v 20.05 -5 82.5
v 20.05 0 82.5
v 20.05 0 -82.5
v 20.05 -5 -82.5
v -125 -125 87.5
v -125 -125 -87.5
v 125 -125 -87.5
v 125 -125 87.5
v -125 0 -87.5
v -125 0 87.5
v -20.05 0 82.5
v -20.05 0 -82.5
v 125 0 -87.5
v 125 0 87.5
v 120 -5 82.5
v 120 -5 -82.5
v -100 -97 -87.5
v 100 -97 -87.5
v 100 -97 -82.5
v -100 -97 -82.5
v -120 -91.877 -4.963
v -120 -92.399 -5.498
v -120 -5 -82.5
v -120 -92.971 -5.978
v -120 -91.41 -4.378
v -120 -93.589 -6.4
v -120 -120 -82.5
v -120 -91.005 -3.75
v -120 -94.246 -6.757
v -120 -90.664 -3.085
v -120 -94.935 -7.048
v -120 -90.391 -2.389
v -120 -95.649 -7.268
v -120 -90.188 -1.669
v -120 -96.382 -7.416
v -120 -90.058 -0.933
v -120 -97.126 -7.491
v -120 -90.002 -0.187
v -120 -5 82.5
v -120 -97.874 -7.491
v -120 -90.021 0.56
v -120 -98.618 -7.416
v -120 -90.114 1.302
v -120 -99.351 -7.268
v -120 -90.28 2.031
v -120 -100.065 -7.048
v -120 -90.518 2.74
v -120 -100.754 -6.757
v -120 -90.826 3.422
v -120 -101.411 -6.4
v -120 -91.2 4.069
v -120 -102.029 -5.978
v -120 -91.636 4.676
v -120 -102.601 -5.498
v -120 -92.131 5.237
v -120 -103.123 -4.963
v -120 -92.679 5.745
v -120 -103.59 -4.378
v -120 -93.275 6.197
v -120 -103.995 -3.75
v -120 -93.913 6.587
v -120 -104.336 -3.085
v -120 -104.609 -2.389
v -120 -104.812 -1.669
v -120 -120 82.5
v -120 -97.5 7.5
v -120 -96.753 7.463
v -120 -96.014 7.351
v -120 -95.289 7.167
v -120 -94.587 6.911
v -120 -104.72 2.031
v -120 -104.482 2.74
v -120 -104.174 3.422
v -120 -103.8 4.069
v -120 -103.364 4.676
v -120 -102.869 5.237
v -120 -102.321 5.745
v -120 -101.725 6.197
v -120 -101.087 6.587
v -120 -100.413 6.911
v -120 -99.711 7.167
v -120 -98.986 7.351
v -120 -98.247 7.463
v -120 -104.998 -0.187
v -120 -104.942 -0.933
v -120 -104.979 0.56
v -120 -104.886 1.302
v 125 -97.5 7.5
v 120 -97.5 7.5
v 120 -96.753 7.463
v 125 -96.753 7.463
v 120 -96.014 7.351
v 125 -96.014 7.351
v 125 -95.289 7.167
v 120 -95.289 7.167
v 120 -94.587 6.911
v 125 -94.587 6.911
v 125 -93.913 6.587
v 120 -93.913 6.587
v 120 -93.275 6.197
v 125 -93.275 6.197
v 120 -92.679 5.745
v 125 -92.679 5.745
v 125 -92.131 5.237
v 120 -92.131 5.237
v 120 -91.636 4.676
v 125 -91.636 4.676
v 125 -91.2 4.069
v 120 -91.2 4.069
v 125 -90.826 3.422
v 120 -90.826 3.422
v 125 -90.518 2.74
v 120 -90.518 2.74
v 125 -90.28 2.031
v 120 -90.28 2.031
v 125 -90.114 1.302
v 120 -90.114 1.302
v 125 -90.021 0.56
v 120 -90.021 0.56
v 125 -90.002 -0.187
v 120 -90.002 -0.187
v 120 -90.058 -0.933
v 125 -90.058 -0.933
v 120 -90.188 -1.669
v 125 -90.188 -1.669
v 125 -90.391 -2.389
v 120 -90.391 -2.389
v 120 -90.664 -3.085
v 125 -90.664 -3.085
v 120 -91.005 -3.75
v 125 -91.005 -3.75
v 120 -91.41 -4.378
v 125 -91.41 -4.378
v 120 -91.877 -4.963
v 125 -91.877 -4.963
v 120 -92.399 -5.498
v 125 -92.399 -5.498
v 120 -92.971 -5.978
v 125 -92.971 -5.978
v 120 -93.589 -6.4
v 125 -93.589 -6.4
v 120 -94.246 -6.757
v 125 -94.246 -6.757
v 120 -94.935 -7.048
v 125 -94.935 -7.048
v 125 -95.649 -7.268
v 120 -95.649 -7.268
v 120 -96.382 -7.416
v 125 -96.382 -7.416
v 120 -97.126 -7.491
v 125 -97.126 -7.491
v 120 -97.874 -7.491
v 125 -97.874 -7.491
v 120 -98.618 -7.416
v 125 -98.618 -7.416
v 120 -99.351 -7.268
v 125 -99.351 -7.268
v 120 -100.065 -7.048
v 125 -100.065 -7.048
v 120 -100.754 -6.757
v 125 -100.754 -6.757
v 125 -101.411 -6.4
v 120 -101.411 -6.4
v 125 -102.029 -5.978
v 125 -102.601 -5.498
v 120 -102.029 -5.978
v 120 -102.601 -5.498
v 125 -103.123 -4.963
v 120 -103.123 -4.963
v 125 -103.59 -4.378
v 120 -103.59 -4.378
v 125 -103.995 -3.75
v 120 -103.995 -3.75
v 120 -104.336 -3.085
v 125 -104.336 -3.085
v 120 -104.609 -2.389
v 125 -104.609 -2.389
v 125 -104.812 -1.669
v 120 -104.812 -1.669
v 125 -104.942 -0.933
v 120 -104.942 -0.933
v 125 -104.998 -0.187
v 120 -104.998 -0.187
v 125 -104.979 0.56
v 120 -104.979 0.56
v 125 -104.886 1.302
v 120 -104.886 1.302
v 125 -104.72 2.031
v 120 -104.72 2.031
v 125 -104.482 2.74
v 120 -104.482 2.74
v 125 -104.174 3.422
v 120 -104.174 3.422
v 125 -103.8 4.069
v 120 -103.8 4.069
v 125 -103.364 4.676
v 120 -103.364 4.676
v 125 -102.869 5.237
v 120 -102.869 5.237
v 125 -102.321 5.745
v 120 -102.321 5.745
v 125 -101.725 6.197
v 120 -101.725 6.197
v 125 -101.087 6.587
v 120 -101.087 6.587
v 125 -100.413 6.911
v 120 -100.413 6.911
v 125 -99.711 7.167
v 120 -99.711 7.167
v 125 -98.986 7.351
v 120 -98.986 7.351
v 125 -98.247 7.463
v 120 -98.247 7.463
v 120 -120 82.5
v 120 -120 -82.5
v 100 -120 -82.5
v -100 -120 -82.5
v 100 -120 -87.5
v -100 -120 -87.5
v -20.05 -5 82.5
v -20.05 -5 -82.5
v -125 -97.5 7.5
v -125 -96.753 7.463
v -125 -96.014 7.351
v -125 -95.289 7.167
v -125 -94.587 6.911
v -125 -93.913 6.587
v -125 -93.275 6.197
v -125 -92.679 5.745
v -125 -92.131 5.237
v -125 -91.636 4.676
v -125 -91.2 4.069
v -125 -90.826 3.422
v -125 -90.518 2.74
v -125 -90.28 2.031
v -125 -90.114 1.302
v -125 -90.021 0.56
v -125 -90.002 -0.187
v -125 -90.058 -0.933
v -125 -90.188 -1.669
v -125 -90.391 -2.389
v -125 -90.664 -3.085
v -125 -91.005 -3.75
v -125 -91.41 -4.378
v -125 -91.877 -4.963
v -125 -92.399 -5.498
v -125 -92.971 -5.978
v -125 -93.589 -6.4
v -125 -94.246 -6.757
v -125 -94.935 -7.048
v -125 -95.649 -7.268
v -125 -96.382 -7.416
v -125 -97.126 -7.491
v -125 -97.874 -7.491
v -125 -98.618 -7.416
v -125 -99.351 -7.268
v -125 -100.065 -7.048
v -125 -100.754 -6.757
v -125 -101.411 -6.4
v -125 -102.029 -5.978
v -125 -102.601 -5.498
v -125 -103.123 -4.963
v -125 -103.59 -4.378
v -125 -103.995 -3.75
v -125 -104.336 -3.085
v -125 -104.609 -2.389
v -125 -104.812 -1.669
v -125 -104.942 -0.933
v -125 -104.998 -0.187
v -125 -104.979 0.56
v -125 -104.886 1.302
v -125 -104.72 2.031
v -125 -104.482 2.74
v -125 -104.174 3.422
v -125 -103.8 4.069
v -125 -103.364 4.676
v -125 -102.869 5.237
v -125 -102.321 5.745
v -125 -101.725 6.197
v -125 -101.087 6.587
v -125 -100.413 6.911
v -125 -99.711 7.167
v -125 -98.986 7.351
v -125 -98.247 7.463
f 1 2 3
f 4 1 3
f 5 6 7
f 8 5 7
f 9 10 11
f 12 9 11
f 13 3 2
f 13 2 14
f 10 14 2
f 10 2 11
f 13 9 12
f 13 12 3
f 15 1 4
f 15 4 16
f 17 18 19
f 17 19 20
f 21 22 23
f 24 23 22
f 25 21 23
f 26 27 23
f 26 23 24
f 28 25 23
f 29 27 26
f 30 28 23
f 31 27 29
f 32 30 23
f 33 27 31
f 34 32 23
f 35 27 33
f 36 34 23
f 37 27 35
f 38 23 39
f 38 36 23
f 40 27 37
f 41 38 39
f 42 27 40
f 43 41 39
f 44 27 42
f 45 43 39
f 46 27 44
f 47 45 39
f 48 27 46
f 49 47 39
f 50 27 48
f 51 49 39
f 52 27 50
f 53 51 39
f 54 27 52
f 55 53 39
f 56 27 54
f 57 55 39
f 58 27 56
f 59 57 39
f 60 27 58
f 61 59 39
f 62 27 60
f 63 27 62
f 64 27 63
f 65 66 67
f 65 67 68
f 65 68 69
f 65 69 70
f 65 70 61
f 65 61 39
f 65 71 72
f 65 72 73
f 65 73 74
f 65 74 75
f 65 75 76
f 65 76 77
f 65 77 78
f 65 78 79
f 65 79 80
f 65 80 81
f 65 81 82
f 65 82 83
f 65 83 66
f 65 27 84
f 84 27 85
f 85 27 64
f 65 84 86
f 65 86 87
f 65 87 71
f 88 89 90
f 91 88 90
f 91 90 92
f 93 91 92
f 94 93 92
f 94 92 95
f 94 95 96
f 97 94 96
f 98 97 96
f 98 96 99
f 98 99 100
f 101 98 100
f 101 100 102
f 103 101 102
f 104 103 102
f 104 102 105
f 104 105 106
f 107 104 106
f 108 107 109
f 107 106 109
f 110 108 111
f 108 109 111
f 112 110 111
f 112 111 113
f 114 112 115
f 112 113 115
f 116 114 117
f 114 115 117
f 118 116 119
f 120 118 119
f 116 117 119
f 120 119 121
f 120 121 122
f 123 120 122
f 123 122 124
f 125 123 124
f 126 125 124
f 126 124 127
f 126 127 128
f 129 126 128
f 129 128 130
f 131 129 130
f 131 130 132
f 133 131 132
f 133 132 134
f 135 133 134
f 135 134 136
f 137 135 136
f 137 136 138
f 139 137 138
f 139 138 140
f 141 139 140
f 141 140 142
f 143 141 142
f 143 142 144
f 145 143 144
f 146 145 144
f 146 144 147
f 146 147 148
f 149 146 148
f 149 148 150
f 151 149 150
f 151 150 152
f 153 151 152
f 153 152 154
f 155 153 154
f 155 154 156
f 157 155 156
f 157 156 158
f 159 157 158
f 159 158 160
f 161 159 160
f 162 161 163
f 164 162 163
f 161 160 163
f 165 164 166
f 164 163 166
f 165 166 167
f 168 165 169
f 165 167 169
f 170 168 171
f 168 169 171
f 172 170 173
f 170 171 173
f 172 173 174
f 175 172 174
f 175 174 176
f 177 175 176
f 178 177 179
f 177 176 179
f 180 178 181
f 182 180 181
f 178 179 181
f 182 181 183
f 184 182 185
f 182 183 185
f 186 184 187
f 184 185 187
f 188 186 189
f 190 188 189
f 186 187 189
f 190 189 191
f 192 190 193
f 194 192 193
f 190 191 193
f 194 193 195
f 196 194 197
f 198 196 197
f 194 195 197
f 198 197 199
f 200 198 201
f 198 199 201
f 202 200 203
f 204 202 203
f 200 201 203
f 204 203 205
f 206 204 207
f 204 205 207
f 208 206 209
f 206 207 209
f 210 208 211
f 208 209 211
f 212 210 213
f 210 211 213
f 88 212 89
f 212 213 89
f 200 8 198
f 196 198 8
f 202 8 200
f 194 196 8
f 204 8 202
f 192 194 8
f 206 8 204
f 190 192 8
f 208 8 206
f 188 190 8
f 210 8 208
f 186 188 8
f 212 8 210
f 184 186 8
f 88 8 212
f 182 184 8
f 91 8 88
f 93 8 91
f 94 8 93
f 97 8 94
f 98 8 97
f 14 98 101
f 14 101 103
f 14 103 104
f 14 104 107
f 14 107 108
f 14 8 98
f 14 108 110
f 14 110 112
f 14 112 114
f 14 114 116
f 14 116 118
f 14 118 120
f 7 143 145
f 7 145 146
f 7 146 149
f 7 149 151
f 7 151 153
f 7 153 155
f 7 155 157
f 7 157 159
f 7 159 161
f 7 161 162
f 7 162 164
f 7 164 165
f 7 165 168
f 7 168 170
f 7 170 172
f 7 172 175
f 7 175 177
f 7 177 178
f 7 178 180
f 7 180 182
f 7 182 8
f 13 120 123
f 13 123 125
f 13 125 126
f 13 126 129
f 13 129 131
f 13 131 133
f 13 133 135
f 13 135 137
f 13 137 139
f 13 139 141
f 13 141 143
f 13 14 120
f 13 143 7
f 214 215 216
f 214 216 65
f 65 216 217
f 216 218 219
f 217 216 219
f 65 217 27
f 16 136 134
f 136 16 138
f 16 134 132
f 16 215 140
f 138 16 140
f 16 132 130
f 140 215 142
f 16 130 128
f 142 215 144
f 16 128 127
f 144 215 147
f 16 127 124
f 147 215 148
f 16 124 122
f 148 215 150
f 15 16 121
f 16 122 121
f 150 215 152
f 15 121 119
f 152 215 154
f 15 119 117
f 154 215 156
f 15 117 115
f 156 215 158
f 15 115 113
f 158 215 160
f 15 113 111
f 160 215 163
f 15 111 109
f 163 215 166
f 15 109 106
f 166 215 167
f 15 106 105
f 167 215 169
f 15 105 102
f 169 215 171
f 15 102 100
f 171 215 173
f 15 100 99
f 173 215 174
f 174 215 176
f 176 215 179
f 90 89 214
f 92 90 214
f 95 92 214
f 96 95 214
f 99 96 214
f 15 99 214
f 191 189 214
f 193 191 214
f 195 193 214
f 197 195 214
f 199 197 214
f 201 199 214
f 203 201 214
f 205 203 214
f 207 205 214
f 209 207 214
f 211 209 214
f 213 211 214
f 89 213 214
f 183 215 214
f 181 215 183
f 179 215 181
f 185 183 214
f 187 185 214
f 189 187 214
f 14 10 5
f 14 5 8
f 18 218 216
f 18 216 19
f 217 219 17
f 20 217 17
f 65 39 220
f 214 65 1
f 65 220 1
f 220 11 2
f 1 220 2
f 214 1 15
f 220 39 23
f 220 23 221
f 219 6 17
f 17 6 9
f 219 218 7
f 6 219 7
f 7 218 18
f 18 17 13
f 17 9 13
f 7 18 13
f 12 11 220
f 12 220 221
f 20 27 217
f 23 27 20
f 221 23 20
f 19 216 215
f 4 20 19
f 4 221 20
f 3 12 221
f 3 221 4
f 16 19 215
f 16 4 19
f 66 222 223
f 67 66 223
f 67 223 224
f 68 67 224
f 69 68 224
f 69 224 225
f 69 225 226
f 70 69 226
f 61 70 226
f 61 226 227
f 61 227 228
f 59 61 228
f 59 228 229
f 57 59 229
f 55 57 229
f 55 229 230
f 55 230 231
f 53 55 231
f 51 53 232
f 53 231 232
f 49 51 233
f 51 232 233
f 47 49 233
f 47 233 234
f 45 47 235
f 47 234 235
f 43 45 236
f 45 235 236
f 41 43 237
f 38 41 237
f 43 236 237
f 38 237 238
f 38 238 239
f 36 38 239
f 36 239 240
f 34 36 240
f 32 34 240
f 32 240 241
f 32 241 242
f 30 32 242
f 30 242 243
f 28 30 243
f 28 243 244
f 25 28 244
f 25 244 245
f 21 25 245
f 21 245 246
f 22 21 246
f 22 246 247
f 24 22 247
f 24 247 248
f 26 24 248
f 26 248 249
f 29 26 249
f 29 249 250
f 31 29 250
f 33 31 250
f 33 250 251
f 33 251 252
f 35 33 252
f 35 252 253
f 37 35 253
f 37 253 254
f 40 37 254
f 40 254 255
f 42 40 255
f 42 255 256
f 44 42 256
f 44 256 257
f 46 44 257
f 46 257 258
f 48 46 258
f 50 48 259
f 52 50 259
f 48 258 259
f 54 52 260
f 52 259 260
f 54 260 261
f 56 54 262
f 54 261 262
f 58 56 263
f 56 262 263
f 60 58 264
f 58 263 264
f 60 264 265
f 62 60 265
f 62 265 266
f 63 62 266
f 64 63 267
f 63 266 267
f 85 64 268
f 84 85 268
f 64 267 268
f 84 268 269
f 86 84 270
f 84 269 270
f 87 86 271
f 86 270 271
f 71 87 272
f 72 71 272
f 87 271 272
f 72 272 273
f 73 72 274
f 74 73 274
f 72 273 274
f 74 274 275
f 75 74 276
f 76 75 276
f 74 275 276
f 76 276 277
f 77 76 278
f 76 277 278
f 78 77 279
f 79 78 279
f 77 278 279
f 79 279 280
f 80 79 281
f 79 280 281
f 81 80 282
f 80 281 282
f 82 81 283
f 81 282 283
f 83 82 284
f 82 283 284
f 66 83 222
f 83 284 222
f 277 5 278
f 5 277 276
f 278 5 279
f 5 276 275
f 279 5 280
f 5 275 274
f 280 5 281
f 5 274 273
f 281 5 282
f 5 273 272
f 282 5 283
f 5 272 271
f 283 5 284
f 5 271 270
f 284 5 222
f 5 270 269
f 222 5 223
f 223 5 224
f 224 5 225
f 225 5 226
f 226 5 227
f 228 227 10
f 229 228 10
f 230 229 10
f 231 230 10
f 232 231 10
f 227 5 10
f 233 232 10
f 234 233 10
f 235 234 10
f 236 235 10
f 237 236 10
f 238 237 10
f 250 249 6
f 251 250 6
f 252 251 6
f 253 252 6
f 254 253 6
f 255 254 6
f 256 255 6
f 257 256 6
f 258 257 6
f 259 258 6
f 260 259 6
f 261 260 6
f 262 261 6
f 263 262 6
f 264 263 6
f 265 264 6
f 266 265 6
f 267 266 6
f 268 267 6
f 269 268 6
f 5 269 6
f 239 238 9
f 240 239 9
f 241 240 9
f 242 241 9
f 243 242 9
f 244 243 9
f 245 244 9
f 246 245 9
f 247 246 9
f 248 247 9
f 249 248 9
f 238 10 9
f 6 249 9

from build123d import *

# Parameters (mm, degrees)
SKETCH1_W           = 250
SKETCH1_H           = 175
BOSS_EXTRUDE1_DEPTH = 125
SKETCH2_W           = 240
SKETCH2_H           = 165
CUT_EXTRUDE1_DEPTH  = 120
SKETCH3_W           = 40.1
SKETCH3_H           = 165
CUT_EXTRUDE2_DEPTH  = 126
SKETCH4_R           = 7.5
CUT_EXTRUDE3_DEPTH  = 251
SKETCH6_W           = 250
SKETCH6_H           = 175
BOSS_EXTRUDE2_DEPTH = 5
SKETCH7_W           = 200
SKETCH7_H           = 23
CUT_EXTRUDE4_DEPTH  = 5


with BuildPart() as part:
    # Sketch1 → Boss-Extrude1 (new body)
    with BuildSketch(Plane(origin=(0, 0, 0), x_dir=(1, 0, 0), z_dir=(0, 1, 0))):
        Rectangle(SKETCH1_W, SKETCH1_H)
    extrude(amount=-BOSS_EXTRUDE1_DEPTH)

    # Sketch2 → Cut-Extrude1 (cut)
    with BuildSketch(Plane.XZ.offset(125)):
        Rectangle(SKETCH2_W, SKETCH2_H)
    extrude(amount=-CUT_EXTRUDE1_DEPTH, mode=Mode.SUBTRACT)

    # Sketch3 → Cut-Extrude2 (cut, through all)
    with BuildSketch(Plane(origin=(0, 0, 0), x_dir=(1, 0, 0), z_dir=(0, 1, 0))):
        Rectangle(SKETCH3_W, SKETCH3_H)
    extrude(amount=-CUT_EXTRUDE2_DEPTH, mode=Mode.SUBTRACT)

    # Sketch4 → Cut-Extrude3 (cut, through all)
    with BuildSketch(Plane.ZY.offset(125)):
        with Locations((0, -97.5)):
            Circle(SKETCH4_R)
    extrude(amount=-CUT_EXTRUDE3_DEPTH, mode=Mode.SUBTRACT)

    # Sketch6 → Boss-Extrude2 (add)
    with BuildSketch(Plane.XZ.offset(125)):
        Rectangle(SKETCH6_W, SKETCH6_H)
    extrude(amount=-BOSS_EXTRUDE2_DEPTH)

    # Sketch7 → Cut-Extrude4 (cut)
    with BuildSketch(Plane(origin=(0, 0, -87.5), x_dir=(-1, 0, 0), z_dir=(0, 0, -1))):
        with Locations((0, -108.5)):
            Rectangle(SKETCH7_W, SKETCH7_H)
    extrude(amount=-CUT_EXTRUDE4_DEPTH, mode=Mode.SUBTRACT)


solid = part.part
